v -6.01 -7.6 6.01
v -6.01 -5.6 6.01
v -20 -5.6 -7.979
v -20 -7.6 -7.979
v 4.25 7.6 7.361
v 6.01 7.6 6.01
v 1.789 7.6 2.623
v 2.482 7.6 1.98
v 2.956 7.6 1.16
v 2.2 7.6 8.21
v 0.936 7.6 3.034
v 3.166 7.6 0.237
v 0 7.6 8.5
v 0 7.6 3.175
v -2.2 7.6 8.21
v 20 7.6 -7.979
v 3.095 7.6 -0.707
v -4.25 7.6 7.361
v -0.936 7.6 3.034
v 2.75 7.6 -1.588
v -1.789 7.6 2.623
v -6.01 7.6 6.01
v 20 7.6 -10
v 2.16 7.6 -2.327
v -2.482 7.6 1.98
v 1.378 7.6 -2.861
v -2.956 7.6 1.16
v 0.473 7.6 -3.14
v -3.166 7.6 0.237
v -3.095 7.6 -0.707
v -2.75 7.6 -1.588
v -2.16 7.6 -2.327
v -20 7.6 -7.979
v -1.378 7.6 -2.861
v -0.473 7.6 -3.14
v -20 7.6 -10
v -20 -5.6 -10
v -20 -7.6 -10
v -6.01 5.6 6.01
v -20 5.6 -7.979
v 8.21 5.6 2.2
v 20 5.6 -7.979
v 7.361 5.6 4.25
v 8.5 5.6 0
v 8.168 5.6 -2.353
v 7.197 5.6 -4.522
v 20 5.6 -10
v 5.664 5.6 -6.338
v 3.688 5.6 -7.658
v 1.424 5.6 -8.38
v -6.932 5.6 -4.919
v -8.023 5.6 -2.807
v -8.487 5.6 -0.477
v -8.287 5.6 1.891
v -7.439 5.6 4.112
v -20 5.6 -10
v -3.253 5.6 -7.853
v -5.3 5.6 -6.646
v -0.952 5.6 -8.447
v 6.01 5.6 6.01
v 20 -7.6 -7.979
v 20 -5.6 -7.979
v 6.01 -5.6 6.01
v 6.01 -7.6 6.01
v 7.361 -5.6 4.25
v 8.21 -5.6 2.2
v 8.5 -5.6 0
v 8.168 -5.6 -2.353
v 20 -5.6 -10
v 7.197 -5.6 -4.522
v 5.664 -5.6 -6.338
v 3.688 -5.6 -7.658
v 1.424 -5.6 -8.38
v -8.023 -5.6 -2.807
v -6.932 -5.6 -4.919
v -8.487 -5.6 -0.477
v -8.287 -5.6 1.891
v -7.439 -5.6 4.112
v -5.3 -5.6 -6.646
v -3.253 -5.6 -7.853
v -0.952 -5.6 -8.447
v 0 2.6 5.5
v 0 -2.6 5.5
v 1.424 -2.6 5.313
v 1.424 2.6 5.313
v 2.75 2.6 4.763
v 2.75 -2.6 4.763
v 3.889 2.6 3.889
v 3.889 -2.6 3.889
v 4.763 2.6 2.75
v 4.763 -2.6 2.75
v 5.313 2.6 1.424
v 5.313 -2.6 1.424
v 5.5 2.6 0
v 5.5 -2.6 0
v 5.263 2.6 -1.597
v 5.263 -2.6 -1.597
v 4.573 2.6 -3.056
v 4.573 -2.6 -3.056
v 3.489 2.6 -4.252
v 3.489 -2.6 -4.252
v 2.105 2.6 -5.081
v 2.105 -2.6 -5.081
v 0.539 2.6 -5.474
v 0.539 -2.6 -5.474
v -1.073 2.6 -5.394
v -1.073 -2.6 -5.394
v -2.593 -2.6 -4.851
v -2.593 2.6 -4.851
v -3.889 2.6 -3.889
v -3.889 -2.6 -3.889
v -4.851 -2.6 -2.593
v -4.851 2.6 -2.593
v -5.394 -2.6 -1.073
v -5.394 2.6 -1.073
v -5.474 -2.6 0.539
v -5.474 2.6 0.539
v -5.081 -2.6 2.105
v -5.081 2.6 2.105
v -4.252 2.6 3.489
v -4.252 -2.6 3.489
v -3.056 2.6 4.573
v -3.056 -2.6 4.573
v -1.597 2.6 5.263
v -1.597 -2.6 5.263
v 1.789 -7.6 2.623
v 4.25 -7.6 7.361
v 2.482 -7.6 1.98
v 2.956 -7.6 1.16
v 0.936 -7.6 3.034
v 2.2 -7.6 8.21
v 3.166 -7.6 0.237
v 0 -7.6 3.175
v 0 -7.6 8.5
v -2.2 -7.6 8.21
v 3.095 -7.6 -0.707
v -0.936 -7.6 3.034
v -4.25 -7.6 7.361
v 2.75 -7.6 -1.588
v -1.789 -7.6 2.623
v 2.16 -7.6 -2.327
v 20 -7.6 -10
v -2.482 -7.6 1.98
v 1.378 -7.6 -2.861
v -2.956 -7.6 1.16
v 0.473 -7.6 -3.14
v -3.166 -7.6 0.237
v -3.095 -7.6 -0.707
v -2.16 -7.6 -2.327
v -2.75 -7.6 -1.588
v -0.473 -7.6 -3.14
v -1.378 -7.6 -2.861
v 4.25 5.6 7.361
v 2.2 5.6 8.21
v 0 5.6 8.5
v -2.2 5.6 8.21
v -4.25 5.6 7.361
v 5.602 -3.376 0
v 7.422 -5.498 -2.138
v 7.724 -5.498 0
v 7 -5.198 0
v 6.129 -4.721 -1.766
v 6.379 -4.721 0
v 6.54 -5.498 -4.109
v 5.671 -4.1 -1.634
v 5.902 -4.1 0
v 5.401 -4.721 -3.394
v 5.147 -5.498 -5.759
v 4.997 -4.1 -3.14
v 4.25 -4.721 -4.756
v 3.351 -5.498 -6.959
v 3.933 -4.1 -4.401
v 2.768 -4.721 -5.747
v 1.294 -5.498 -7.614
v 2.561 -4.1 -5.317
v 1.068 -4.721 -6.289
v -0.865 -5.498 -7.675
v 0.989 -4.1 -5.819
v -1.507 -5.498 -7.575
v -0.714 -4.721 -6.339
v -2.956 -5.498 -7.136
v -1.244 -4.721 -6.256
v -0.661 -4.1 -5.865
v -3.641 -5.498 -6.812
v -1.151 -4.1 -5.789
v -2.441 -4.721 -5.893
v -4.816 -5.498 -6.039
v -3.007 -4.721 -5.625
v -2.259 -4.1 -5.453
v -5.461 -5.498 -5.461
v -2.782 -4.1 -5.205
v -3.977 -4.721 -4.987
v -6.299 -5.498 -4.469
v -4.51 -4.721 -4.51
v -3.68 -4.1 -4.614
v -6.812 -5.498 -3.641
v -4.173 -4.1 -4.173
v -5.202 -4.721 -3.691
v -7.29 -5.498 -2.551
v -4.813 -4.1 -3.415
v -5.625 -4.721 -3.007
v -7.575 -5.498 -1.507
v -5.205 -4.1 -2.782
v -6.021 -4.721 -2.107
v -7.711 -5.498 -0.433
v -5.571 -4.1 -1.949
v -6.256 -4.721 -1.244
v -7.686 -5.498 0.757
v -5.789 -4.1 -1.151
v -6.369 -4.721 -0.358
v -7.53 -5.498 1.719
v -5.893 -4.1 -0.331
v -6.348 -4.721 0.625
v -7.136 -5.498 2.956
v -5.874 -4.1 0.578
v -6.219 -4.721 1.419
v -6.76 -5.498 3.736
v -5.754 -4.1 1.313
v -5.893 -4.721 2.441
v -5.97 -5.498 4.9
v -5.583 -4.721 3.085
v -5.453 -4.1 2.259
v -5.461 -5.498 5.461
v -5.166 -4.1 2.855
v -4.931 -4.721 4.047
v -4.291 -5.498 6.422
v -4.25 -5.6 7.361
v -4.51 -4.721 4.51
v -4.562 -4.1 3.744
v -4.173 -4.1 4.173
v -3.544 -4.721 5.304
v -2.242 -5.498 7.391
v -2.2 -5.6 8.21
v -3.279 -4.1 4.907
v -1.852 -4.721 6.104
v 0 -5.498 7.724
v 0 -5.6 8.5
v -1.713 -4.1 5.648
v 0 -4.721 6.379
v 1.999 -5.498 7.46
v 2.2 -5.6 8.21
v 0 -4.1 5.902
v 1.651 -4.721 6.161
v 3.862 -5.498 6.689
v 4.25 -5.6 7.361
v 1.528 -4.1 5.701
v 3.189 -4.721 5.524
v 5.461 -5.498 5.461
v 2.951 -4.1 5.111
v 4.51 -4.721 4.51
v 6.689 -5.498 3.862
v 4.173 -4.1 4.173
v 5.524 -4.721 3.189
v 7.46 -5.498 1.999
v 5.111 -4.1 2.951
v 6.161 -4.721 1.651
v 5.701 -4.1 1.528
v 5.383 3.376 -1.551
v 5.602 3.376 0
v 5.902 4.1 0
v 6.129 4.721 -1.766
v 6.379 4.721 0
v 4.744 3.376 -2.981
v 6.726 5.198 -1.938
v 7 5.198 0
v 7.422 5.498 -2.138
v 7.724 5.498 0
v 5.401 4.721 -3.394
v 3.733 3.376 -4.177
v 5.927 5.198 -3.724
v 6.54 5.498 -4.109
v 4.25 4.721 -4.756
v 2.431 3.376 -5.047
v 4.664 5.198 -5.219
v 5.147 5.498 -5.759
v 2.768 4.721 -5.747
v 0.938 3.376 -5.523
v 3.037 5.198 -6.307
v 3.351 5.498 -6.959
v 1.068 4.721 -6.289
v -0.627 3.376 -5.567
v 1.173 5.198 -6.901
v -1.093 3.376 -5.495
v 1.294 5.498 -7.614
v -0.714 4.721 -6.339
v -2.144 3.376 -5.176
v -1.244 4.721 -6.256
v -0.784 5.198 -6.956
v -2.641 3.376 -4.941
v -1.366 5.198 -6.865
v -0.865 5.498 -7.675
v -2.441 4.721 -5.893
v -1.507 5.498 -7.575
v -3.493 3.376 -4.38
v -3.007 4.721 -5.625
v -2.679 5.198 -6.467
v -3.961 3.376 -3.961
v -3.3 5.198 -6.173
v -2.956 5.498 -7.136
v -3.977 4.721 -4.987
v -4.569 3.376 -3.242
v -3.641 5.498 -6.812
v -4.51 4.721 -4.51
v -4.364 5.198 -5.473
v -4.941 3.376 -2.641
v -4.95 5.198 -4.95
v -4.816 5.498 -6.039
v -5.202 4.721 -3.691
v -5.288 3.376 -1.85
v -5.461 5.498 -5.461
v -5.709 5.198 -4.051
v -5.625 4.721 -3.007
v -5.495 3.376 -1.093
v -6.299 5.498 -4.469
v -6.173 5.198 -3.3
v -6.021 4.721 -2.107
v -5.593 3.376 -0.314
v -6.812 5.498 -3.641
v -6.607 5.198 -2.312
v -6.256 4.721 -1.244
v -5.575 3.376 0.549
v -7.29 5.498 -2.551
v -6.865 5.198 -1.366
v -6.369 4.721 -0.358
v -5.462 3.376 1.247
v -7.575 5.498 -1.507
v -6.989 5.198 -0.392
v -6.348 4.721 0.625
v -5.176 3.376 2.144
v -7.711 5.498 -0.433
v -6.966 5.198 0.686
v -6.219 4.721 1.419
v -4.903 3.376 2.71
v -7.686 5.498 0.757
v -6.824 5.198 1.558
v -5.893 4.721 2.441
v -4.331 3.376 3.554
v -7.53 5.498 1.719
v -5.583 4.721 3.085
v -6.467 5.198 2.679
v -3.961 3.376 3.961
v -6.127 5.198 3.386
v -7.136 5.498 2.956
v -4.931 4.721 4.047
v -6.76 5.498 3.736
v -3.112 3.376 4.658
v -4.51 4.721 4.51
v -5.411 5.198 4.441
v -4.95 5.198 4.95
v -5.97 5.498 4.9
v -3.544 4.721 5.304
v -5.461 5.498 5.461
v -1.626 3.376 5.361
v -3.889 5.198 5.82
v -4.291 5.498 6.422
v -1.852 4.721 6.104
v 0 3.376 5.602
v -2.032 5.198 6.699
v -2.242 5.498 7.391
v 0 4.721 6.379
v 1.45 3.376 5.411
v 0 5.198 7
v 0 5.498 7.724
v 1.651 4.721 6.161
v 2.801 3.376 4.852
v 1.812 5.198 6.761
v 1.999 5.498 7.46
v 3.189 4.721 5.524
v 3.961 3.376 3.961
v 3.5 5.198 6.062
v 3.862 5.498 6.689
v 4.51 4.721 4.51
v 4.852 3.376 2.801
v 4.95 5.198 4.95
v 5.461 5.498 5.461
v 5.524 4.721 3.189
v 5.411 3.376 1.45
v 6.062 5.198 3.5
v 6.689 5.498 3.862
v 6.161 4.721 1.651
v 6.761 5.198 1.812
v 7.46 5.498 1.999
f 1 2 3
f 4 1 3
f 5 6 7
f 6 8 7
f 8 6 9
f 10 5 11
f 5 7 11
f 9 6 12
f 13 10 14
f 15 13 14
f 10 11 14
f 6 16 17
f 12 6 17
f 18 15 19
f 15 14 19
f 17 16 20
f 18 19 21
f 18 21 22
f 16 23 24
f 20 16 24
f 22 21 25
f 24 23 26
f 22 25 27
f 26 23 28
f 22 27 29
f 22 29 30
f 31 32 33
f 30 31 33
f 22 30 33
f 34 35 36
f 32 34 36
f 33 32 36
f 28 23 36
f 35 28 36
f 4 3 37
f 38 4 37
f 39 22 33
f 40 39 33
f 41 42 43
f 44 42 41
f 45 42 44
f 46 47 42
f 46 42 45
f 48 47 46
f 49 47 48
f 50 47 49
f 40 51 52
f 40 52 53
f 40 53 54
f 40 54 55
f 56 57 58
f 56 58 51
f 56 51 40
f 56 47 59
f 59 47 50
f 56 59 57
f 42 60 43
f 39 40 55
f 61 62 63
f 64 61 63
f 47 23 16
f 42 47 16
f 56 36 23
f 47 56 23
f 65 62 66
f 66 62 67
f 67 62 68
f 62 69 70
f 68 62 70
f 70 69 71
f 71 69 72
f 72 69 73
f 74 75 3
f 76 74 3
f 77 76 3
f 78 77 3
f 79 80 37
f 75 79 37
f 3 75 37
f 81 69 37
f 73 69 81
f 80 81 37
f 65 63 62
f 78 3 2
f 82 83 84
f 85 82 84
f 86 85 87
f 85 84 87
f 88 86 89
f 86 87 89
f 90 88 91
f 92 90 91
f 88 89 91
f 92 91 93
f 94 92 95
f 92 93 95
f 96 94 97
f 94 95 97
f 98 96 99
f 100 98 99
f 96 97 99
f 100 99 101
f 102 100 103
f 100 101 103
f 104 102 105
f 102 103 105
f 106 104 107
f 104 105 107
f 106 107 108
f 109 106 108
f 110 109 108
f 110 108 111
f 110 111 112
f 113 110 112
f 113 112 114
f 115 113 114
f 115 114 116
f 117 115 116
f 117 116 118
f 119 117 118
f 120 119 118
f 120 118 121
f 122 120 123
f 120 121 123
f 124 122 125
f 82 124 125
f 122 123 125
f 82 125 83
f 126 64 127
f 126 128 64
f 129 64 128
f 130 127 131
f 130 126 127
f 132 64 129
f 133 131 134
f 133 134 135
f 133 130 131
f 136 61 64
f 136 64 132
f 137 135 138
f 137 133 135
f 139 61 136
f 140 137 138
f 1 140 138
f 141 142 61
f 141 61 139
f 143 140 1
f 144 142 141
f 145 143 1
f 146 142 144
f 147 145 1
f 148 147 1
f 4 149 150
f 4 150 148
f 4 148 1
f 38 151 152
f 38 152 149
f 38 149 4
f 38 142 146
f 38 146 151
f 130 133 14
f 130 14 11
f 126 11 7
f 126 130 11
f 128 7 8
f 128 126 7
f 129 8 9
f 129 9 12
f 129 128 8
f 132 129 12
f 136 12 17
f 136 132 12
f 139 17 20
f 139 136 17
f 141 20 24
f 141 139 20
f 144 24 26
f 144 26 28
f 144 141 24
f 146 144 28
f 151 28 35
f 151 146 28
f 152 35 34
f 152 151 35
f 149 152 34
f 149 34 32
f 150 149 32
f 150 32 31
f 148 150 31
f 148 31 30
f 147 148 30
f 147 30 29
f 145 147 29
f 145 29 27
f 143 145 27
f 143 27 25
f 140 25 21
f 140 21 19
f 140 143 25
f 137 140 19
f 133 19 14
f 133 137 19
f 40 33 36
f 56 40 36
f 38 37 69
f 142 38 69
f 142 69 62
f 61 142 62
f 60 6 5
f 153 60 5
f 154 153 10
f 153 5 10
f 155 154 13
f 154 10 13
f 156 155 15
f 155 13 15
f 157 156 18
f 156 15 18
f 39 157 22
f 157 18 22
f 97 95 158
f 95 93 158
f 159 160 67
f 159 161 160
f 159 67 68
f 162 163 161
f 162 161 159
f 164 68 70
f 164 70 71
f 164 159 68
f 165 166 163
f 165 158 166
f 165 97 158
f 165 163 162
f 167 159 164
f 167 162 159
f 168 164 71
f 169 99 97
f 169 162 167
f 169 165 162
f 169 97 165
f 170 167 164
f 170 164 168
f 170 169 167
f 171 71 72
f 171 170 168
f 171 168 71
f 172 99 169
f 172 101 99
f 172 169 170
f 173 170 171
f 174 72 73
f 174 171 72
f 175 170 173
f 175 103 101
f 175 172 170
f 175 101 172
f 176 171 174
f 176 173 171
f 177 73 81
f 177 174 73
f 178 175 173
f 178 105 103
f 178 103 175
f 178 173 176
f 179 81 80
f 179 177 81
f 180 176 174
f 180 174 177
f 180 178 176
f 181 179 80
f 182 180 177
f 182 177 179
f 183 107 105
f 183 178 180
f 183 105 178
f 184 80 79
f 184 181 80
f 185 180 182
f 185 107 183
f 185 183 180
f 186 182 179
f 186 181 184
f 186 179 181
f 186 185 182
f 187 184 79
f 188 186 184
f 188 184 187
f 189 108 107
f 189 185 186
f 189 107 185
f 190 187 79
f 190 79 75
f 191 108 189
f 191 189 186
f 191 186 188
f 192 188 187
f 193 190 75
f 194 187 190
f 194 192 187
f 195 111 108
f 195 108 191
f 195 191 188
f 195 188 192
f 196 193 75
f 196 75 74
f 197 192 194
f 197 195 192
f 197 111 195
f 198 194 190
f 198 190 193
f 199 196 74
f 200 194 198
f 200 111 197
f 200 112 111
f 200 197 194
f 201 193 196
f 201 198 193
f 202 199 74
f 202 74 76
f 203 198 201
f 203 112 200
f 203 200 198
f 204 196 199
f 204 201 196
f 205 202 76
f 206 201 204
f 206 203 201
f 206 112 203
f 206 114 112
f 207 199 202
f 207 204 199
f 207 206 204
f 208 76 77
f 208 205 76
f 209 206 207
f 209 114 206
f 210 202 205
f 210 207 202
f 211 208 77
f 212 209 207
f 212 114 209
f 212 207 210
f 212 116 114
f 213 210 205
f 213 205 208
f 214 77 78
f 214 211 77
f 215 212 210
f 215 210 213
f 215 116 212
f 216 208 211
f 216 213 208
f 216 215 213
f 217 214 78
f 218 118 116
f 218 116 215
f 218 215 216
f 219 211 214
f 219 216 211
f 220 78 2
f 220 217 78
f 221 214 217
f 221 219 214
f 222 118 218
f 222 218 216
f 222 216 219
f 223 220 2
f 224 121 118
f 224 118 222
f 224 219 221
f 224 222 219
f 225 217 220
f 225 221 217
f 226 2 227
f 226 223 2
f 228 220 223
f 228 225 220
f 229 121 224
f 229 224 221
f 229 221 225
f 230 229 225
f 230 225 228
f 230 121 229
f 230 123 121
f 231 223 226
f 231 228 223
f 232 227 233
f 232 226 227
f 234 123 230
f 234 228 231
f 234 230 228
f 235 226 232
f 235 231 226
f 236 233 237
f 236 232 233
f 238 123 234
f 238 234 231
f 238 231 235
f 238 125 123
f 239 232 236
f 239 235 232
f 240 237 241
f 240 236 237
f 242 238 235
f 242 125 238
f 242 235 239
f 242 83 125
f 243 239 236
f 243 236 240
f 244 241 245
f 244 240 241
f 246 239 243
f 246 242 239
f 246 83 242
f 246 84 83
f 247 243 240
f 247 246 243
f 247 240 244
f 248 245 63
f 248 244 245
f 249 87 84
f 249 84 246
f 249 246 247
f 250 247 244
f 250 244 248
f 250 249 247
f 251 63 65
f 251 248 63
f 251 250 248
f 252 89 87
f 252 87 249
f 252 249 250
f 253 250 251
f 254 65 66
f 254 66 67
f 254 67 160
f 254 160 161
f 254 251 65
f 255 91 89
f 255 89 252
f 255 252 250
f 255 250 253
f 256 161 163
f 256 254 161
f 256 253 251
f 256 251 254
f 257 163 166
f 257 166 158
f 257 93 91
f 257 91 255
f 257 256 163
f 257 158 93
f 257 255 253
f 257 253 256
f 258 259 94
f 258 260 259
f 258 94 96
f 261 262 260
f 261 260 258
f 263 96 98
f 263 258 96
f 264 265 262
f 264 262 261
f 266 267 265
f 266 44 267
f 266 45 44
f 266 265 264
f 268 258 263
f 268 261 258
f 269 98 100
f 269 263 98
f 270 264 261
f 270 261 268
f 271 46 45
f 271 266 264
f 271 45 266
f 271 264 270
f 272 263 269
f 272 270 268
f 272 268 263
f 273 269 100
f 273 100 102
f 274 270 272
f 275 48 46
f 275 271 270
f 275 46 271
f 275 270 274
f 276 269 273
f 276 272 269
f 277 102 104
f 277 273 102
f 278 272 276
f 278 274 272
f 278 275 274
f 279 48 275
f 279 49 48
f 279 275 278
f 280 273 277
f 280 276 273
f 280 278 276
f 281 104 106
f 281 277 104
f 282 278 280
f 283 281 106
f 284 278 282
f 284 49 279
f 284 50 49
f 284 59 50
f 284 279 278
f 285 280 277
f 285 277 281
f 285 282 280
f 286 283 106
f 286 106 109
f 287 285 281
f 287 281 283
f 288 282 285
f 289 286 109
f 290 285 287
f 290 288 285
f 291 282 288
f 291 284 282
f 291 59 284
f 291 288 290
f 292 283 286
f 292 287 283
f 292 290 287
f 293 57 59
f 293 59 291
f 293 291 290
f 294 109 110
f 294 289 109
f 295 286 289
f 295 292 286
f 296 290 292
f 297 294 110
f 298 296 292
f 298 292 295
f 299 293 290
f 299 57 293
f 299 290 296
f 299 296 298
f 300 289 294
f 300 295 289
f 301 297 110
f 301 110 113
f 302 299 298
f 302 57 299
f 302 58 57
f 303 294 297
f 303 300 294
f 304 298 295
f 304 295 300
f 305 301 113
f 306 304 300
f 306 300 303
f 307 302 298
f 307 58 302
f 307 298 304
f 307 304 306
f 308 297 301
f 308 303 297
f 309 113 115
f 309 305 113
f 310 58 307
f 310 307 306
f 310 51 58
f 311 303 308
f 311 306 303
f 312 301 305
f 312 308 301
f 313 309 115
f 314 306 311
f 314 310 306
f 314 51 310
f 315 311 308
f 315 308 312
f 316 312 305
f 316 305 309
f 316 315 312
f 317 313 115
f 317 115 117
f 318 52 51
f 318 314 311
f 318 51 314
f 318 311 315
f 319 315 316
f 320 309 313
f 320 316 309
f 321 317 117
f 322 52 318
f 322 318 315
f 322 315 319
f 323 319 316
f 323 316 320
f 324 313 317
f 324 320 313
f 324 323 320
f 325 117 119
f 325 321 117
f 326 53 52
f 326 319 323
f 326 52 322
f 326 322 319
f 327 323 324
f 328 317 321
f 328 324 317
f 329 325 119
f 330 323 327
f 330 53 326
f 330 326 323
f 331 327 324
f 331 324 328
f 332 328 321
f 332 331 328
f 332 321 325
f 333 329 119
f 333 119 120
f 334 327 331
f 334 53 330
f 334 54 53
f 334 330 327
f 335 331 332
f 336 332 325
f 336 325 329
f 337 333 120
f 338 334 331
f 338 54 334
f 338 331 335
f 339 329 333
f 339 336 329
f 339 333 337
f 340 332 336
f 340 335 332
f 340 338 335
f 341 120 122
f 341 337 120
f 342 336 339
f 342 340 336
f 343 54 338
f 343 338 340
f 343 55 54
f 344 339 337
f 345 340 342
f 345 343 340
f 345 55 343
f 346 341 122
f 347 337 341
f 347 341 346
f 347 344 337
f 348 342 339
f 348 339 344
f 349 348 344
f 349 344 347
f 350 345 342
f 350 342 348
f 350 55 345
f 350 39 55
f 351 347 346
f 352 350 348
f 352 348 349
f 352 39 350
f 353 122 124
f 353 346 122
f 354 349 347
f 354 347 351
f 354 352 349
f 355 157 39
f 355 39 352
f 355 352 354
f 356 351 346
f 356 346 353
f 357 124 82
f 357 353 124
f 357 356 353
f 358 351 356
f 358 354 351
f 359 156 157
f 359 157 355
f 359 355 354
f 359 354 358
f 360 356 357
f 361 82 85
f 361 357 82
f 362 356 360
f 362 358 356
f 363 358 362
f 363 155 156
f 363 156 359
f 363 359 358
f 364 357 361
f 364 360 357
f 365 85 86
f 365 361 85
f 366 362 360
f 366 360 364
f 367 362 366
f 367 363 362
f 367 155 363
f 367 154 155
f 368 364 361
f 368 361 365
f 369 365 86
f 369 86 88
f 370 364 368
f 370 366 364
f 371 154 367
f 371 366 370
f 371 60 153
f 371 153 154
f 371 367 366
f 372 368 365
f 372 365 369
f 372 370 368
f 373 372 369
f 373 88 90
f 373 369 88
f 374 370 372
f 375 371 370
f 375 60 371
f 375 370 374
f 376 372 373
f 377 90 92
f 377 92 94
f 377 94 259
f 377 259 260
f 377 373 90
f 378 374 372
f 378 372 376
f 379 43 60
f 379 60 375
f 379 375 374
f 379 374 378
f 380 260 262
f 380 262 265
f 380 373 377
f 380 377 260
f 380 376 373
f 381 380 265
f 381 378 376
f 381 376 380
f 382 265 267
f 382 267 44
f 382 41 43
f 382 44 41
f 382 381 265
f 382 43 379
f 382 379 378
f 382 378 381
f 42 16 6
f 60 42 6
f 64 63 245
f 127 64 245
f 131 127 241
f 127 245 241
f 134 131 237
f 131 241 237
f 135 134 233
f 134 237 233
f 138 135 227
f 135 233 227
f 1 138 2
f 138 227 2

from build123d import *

# Parameters (mm, degrees)
BOSS_EXTRUDE1_DEPTH      = 7.6
BOSS_EXTRUDE1_DEPTH_BACK = 7.6
SKETCH1_R                = 5.5
SKETCH1_R_2              = 3.175
BOSS_EXTRUDE2_START      = 7.6
SKETCH2_R                = 5.5
BOSS_EXTRUDE2_DEPTH      = 2
BOSS_EXTRUDE3_START      = -5.6
SKETCH2_2_R              = 5.5
BOSS_EXTRUDE3_DEPTH      = 2


with BuildPart() as part:
    # Sketch1 → Boss-Extrude1 (new, two sides: drawn at the far end of the back side and taken through both)
    with BuildSketch(Plane(origin=(0, 0, 0), x_dir=(1, 0, 0), z_dir=(0, 1, 0)).offset(-BOSS_EXTRUDE1_DEPTH_BACK)):
        with Locations(Location((0, 0, 0), (0, 0, 270))):
            Circle(SKETCH1_R)
        with Locations(Location((0, 0, 0), (0, 0, 270))):
            Circle(SKETCH1_R_2, mode=Mode.SUBTRACT)
    extrude(amount=BOSS_EXTRUDE1_DEPTH + BOSS_EXTRUDE1_DEPTH_BACK)

    # Sketch2 → Boss-Extrude2 (add)
    with BuildSketch(Plane(origin=(0, 0, 0), x_dir=(1, 0, 0), z_dir=(0, 1, 0)).offset(BOSS_EXTRUDE2_START)):
        with BuildLine():
            Line((-20, 10), (20, 10))
            Line((20, 10), (20, 7.97918472))
            Line((20, 7.97918472), (6.01040764, -6.01040764))
            ThreePointArc((6.01040764, -6.01040764), (0, -8.5), (-6.01040764, -6.01040764))
            Line((-6.01040764, -6.01040764), (-20, 7.97918472))
            Line((-20, 7.97918472), (-20, 10))
        make_face()
        with Locations(Location((0, 0, 0), (0, 0, 270))):
            Circle(SKETCH2_R, mode=Mode.SUBTRACT)
    extrude(amount=-BOSS_EXTRUDE2_DEPTH)

    # Sketch2<2> → Boss-Extrude3 (add)
    with BuildSketch(Plane(origin=(0, 0, 0), x_dir=(1, 0, 0), z_dir=(0, 1, 0)).offset(BOSS_EXTRUDE3_START)):
        with BuildLine():
            Line((-20, 10), (20, 10))
            Line((20, 10), (20, 7.97918472))
            Line((20, 7.97918472), (6.01040764, -6.01040764))
            ThreePointArc((6.01040764, -6.01040764), (0, -8.5), (-6.01040764, -6.01040764))
            Line((-6.01040764, -6.01040764), (-20, 7.97918472))
            Line((-20, 7.97918472), (-20, 10))
        make_face()
        with Locations(Location((0, 0, 0), (0, 0, 270))):
            Circle(SKETCH2_2_R, mode=Mode.SUBTRACT)
    extrude(amount=-BOSS_EXTRUDE3_DEPTH)

    # Fillet1: read off the stored shape, not the designer's step
    # Fillet1 outline → Fillet1 (revolve)
    with BuildSketch(Plane.XY):
        with BuildLine():
            ThreePointArc((5.5, 2.6), (6.378679656, 4.721320344), (8.5, 5.6))
            Line((8.5, 5.6), (5.5, 5.6))
            Line((5.5, 5.6), (5.5, 2.6))
        make_face()
        with BuildLine():
            ThreePointArc((8.5, -5.6), (6.378679656, -4.721320344), (5.5, -2.6))
            Line((5.5, -2.6), (5.5, -5.6))
            Line((5.5, -5.6), (8.5, -5.6))
        make_face()
    revolve(axis=Axis((0, 0, 0), (0, 1, 0)))


solid = part.part
